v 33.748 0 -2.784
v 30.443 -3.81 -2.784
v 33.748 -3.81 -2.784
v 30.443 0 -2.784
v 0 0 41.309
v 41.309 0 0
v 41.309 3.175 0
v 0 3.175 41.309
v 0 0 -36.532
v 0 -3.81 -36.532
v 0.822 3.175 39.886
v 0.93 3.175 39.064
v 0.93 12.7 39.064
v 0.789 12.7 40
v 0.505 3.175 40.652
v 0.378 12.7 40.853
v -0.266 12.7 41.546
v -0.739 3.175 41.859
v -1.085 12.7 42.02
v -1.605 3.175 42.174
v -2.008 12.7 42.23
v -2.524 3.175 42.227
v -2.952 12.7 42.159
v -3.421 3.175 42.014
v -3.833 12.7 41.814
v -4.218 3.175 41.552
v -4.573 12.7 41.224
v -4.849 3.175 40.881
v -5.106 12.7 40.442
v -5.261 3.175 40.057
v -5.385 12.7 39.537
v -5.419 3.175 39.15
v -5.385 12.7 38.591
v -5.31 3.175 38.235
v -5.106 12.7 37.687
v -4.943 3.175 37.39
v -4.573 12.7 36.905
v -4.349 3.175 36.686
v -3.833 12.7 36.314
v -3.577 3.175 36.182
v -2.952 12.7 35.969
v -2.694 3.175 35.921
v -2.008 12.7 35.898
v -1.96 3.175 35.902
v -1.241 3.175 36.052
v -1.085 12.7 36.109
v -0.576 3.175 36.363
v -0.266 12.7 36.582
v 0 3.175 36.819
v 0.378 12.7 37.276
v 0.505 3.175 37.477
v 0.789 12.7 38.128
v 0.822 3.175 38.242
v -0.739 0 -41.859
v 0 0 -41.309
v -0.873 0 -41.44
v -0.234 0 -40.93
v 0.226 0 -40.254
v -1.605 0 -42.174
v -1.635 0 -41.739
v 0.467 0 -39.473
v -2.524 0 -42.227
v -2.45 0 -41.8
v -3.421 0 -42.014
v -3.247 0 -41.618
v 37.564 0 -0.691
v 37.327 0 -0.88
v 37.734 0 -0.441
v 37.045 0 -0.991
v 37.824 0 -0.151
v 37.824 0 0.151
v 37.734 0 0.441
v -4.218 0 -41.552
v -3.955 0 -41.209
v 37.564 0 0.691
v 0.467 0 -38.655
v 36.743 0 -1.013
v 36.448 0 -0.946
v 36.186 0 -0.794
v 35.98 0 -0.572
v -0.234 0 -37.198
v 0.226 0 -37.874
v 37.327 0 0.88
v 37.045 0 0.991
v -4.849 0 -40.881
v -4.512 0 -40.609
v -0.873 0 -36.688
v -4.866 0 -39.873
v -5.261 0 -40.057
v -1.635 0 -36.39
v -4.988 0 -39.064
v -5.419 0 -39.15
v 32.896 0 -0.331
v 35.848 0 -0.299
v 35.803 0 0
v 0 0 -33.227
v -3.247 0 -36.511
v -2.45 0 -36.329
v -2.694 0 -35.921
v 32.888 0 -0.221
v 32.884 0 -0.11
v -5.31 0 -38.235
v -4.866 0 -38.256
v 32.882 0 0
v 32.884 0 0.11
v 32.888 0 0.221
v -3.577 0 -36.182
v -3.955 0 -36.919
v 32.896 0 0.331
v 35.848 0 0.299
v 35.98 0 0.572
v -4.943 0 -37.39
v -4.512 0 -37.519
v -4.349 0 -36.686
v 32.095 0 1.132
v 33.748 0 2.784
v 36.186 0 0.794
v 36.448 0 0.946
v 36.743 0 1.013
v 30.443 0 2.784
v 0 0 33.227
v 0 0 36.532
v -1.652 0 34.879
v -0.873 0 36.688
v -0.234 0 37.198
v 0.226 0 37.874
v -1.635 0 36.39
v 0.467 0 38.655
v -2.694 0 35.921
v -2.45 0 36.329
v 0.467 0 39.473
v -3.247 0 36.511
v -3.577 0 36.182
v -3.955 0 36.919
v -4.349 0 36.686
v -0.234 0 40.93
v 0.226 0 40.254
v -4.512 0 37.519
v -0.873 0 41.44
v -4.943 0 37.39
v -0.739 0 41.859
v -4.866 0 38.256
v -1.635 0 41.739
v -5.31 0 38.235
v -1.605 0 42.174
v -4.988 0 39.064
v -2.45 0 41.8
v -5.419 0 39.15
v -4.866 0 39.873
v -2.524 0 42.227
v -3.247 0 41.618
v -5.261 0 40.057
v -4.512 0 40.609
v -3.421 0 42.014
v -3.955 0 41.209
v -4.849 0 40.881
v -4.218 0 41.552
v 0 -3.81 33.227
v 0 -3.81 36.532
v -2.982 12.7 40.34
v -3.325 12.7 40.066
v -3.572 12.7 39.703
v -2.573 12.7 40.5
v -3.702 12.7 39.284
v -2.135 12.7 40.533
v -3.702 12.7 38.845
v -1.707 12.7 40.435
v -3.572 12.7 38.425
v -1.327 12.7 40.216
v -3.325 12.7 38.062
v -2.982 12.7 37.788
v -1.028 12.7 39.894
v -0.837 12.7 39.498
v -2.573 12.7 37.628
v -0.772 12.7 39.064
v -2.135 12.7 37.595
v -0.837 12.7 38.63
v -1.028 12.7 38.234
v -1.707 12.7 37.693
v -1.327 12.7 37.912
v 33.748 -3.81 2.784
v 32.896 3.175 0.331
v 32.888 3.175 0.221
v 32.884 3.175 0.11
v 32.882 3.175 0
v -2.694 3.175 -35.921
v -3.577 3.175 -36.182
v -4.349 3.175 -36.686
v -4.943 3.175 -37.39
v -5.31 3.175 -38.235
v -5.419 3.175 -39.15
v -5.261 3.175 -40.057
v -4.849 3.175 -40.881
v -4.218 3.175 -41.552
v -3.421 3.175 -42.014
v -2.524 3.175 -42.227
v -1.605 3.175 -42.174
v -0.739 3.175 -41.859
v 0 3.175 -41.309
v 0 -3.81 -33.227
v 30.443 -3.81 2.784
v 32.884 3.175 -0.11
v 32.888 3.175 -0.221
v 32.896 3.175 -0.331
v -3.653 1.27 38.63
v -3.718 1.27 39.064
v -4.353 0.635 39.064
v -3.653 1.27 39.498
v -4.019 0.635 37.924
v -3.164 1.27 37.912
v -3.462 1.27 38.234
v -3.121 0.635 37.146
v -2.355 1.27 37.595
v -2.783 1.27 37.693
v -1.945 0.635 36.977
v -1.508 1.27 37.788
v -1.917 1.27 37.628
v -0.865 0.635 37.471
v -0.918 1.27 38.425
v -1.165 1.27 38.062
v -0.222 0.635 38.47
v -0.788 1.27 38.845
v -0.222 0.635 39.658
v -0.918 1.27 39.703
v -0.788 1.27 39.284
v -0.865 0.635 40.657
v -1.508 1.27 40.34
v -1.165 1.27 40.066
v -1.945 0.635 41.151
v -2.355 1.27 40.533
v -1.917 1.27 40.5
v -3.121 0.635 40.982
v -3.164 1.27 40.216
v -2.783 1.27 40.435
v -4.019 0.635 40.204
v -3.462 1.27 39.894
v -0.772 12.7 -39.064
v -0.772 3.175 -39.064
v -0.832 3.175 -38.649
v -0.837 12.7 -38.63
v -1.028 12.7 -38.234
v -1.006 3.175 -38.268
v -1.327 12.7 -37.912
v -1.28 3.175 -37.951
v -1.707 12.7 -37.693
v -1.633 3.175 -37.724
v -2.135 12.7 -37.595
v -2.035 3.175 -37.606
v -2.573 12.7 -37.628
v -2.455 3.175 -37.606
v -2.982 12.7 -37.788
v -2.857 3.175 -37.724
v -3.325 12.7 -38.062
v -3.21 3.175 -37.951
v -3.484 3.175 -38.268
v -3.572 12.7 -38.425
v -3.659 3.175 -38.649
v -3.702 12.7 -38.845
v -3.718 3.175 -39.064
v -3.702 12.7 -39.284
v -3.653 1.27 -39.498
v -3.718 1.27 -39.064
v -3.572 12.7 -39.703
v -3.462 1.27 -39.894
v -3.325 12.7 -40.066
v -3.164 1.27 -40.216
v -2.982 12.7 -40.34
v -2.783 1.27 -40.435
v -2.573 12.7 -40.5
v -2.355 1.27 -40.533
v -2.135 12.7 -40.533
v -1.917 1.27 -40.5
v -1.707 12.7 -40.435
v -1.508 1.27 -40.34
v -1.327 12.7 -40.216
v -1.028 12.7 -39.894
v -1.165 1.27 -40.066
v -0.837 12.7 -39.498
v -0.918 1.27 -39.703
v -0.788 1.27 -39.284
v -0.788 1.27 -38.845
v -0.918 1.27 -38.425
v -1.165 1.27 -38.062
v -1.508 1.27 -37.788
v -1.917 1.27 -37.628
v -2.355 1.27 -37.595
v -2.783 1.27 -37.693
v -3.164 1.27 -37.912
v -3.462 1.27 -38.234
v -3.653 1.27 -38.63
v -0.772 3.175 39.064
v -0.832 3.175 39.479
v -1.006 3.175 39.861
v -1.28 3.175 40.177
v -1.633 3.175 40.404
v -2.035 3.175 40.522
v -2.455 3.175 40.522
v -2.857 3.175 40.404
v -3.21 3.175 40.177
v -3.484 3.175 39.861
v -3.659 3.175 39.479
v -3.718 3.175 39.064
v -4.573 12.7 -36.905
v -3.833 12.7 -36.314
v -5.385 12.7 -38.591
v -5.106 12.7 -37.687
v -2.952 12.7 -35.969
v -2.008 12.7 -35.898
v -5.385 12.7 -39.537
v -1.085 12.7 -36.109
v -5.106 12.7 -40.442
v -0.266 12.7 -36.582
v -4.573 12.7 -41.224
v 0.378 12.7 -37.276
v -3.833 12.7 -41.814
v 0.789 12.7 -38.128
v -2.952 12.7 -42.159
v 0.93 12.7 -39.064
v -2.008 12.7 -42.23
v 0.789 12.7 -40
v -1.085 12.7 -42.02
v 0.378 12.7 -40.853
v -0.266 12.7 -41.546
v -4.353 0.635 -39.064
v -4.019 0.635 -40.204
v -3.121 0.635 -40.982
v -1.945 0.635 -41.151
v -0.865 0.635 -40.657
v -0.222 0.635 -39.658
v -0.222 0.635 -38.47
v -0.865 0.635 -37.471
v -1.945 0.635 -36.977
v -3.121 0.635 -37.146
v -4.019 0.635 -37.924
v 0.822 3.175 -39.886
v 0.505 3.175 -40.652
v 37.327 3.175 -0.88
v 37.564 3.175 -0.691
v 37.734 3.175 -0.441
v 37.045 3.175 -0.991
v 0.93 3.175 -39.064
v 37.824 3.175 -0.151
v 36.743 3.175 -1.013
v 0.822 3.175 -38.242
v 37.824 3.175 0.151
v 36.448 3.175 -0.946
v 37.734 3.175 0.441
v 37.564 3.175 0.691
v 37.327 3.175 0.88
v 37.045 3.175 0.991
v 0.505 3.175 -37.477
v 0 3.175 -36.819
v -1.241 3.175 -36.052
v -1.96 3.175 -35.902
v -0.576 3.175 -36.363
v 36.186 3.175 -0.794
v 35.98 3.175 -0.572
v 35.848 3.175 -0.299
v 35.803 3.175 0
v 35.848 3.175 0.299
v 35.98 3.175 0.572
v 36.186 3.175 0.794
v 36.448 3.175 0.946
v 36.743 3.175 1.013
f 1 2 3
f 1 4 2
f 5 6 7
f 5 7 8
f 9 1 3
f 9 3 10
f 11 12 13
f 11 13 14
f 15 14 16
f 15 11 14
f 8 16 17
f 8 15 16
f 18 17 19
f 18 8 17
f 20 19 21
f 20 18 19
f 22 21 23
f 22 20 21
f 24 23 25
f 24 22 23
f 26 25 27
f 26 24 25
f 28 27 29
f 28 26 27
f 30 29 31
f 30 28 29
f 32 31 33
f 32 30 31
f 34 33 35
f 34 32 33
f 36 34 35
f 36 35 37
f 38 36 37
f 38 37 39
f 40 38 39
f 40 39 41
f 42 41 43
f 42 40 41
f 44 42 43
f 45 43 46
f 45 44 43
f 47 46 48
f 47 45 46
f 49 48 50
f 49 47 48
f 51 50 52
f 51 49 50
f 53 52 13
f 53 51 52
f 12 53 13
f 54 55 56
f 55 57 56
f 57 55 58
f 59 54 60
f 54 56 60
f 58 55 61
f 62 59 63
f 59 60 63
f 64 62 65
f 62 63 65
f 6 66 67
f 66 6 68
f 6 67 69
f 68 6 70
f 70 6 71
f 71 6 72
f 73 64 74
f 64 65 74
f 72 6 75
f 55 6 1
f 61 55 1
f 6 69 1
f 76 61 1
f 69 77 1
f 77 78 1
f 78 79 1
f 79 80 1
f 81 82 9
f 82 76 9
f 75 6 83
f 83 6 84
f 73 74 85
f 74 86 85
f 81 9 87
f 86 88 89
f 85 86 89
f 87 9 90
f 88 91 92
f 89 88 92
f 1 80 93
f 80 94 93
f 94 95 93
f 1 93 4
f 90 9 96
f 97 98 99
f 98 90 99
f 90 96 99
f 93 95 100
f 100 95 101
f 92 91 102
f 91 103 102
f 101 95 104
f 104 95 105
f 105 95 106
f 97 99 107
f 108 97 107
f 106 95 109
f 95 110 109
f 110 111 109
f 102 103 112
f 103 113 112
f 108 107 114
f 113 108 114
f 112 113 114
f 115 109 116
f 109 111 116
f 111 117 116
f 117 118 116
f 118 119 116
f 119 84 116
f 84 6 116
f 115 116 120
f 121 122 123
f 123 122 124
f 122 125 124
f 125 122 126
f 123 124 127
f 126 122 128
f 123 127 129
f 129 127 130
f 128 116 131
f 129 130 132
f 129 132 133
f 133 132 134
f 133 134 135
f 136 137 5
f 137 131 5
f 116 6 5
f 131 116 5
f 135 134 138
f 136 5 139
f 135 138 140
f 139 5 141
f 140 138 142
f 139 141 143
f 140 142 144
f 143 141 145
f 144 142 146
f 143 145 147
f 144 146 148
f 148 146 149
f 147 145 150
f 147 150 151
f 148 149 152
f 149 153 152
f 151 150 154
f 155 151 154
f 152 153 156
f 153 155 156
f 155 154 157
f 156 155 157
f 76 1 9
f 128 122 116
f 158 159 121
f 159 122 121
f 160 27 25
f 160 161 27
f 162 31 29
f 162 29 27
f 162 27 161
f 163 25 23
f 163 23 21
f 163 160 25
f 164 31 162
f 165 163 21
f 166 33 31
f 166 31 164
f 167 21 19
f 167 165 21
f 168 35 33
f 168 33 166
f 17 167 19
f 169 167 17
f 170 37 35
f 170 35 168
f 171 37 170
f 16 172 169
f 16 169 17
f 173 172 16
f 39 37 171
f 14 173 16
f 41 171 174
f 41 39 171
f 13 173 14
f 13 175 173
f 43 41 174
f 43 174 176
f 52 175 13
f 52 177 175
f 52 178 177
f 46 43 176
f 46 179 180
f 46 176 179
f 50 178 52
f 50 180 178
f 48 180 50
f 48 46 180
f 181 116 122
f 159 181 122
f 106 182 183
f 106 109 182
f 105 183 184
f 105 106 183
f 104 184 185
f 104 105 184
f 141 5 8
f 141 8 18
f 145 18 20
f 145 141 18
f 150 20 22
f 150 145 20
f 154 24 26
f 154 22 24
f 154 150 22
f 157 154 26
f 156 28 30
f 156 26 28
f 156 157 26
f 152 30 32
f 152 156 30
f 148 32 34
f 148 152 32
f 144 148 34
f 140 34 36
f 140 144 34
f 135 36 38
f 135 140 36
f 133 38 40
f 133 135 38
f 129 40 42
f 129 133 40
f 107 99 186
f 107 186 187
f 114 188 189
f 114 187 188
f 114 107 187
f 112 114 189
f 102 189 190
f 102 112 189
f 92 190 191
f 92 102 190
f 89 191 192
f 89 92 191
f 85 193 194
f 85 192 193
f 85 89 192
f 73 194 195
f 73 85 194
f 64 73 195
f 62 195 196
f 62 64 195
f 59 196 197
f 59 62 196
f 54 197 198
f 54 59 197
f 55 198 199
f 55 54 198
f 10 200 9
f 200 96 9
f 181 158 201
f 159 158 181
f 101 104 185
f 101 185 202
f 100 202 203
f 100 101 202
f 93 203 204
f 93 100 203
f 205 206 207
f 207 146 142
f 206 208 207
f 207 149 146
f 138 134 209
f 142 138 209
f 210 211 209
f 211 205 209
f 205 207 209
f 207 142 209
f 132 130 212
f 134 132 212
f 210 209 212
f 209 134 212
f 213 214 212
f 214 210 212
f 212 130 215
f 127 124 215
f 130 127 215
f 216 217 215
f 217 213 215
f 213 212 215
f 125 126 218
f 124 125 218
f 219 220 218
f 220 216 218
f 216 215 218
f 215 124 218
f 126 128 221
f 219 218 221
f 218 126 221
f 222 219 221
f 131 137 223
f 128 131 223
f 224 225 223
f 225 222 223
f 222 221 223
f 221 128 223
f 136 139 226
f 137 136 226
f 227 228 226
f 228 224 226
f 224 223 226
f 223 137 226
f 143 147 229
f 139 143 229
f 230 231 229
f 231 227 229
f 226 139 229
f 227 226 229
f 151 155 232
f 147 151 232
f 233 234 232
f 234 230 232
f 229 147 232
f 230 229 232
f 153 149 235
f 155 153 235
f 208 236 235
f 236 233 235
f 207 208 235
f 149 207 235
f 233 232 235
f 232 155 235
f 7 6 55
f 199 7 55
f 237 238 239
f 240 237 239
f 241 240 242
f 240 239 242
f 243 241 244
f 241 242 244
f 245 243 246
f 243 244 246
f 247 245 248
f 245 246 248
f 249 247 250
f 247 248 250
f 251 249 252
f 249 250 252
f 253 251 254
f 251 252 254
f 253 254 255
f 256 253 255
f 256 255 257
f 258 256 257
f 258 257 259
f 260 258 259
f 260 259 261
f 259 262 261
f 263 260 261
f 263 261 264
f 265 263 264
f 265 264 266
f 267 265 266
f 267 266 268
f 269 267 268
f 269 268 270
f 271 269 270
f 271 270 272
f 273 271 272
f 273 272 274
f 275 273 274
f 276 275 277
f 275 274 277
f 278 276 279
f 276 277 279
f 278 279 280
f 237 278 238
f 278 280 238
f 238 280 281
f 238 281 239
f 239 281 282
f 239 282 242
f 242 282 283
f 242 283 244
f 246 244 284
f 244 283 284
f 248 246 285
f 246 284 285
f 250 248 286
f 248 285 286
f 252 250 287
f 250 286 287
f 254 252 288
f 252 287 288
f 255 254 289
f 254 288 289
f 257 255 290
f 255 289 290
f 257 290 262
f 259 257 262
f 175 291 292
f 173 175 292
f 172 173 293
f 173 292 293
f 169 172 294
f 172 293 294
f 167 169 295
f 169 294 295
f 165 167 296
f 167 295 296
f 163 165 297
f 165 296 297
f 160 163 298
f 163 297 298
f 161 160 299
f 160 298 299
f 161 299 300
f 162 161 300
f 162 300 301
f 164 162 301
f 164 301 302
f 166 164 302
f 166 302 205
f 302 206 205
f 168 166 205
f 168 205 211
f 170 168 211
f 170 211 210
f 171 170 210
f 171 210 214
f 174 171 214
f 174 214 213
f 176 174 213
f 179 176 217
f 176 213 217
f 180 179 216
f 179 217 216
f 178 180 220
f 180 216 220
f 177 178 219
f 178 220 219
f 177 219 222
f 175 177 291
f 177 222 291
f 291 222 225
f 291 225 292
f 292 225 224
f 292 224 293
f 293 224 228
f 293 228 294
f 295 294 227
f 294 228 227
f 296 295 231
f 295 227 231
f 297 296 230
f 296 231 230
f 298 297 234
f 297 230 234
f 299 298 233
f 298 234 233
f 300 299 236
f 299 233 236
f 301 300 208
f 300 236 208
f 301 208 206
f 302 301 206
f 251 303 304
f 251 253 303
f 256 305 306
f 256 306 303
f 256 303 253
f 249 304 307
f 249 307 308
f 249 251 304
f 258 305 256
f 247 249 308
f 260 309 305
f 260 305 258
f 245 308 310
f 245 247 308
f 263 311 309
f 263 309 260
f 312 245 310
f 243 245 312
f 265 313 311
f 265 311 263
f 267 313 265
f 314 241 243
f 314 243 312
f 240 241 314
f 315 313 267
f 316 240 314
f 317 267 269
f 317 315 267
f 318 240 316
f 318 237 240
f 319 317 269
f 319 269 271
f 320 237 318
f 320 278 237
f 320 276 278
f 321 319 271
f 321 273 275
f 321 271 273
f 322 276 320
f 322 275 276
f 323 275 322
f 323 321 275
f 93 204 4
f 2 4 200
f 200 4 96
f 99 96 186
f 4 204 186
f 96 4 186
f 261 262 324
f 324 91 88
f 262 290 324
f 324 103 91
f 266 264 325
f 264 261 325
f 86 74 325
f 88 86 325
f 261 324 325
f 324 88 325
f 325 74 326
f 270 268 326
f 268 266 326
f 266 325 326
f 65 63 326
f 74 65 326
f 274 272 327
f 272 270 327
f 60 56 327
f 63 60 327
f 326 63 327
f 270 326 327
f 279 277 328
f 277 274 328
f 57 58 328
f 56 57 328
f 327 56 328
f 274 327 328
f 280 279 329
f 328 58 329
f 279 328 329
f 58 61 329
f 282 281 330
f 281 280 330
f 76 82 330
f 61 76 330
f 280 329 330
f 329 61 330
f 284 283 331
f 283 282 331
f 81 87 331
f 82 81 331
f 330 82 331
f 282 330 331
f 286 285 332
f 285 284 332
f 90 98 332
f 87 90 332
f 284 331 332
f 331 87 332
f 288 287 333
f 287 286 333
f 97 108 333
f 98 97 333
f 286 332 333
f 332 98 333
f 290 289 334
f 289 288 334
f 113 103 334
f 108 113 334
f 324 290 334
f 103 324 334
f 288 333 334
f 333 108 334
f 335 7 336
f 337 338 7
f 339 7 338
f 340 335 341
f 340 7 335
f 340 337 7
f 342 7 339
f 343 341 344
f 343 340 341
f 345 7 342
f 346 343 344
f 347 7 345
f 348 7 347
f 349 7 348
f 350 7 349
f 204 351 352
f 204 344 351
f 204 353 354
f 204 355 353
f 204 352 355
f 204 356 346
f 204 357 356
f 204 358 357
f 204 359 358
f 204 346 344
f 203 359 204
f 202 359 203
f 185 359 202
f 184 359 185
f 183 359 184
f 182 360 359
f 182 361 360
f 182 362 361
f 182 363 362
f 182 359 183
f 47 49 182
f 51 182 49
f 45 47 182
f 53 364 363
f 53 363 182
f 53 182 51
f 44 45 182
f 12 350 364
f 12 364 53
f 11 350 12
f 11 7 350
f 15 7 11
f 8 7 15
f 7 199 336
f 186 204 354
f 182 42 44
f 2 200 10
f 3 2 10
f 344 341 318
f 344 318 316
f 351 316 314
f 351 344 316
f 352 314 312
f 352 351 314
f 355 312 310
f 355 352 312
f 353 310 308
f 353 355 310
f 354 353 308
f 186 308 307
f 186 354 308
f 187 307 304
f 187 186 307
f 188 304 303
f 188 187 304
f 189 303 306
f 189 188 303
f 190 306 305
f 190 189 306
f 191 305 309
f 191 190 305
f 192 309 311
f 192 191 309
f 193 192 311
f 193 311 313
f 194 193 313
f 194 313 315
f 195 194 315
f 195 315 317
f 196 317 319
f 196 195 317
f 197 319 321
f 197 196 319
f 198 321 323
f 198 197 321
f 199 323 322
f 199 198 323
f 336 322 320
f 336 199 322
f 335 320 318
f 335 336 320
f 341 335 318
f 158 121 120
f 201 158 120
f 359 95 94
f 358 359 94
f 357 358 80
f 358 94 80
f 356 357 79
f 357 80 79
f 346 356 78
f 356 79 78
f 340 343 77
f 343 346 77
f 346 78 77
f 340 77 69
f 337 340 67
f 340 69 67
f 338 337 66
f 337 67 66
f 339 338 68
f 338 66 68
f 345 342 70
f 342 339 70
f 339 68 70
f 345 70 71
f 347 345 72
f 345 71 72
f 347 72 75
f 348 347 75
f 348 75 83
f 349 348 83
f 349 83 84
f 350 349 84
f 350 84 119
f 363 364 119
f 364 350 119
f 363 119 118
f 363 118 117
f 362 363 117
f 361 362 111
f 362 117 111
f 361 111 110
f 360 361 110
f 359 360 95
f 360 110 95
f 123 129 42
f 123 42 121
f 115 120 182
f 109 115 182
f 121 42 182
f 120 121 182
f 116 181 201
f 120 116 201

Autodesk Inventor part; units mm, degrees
ref_plane "YZ Plane" through (0, 0, 0) normal (1, 0, 0) x (0, 1, 0)
ref_plane "XZ Plane" through (0, 0, 0) normal (0, 1, 0) x (-1, 0, 0)
sketch "Sketch1" plane through (0, 0, 0) normal (0, 1, 0) x (-1, 0, 0)
  line L0 (-41.3092, 0) -> (0, 41.3092)
  circle A0 centre (-36.8191, 0) radius 1.016
  arc A1 (-32.8821, 0) -> (-34.0352, 2.7839) centre (-36.8191, 0) ccw
  line L1 (0, 41.3092) -> (2.2451, 39.0641)
  arc A2 (0, 36.8191) -> (0, 41.3092) centre (2.2451, 39.0641) ccw
  circle A3 centre (2.2451, 39.0641) radius 1.4732
  line L2 (0, 36.8191) -> (-34.0352, 2.7839)
  line L3 (0, 0) -> (-14.0183, 0)
  line L4 (-41.3092, 0) -> (0, -41.3092)
  circle A4 centre (-36.8191, 0) radius 1.016
  arc A5 (-34.0352, -2.7839) -> (-32.8821, 0) centre (-36.8191, 0) ccw
  line L5 (0, -41.3092) -> (2.2451, -39.0641)
  arc A6 (0, -41.3092) -> (0, -36.8191) centre (2.2451, -39.0641) ccw
  circle A7 centre (2.2451, -39.0641) radius 1.4732
  line L6 (0, -36.8191) -> (-34.0352, -2.7839)
  dimension "d0" = 3.175
  dimension "d1" = 58.42
  dimension "d2" = 45
  dimension "d3" = 2.9464
  dimension "d4" = 3.175
  dimension "d5" = 3.937
  dimension "d6" = 2.032
  dimension "d7" = 45
extrude "Extrusion1" add sketch "Sketch1" along normal blind 3.175
sketch "Sketch2" plane through (0, 3.175, 0) normal (0, 1, 0) x (1, 0, 0)
  circle A0 centre (-2.2451, -39.0641) radius 1.4732 projected
  circle A1 centre (-2.2451, -39.0641) radius 3.175
  circle A2 centre (-2.2451, 39.0641) radius 1.4732 projected
  circle A3 centre (-2.2451, 39.0641) radius 3.175
  point P0 (0, 0)
  dimension "d10" = 6.35
  dimension "d11" = 6.35
extrude "Extrusion2" add sketch "Sketch2" along normal blind 9.525
chamfer "Chamfer1" distance 1.27 angle 45 2 edges at (-0.7719, 0, 39.0641) (-0.7719, 0, -39.0641)
sketch "Sketch3" plane through (0, 3.175, 0) normal (0, 1, 0) x (1, 0, 0)
  arc A0 (0, -36.8191) -> (0, -41.3092) centre (-2.2451, -39.0641) ccw projected
  line L0 (34.0352, -2.7839) -> (0, -36.8191) projected
  arc A1 (34.0352, 2.7839) -> (34.0352, -2.7839) centre (36.8191, 0) ccw projected
  line L1 (0, 36.8191) -> (34.0352, 2.7839) projected
  arc A2 (0, 41.3092) -> (0, 36.8191) centre (-2.2451, 39.0641) ccw projected
  line L2 (-2.6941, -35.921) -> (32.896, -0.331)
  arc A3 (34.0352, 2.7839) -> (34.0352, -2.7839) centre (36.8191, 0) ccw projected
  line L3 (32.896, 0.331) -> (-2.6941, 35.921)
  point P0 (0, 0)
  dimension "d17" = 2.54
  dimension "d18" = 2.54
ref_plane "Work Plane1" through (0, -3.81, 0) normal (0, 1, 0) x (1, 0, 0)
extrude "Extrusion3" add sketch "Sketch3" against normal up to surface (3.175 mm away)
sketch "Sketch4" plane through (0, 0, 0) normal (0, -1, 0) x (1, 0, 0)
  line L0 (0, -36.8191) -> (34.0352, -2.7839) projected
  line L1 (0, 36.8191) -> (34.0352, 2.7839) projected
  line L2 (-2.6941, -35.921) -> (32.896, -0.331) projected
  line L3 (-1.6524, -34.8793) -> (32.0954, -1.1315)
  line L4 (32.0954, -1.1315) -> (33.7478, -2.7839)
  line L5 (33.7478, -2.7839) -> (0, -36.5317)
  line L6 (0, -36.5317) -> (-1.6524, -34.8793)
  line L7 (0, 0) -> (11.5163, 0)
  line L8 (-1.6524, 34.8793) -> (32.0954, 1.1315)
  line L9 (32.0954, 1.1315) -> (33.7478, 2.7839)
  line L10 (33.7478, 2.7839) -> (0, 36.5317)
  line L11 (0, 36.5317) -> (-1.6524, 34.8793)
  dimension "d22" = 0.2032
  dimension "d23" = 0.2032
  dimension "d24" = 0.2032
extrude "Extrusion4" add sketch "Sketch4" along normal up to surface (3.81 mm away)
chamfer "Chamfer2" distance 2.3368 angle 45 4 edges at (-1.6524, -1.905, -34.8793) (-1.6524, -1.905, 34.8793) (32.0954, -1.905, 1.1315) (32.0954, -1.905, -1.1315)
properties part number "WIDE SCREEN HOLDER 2SCREEN"
